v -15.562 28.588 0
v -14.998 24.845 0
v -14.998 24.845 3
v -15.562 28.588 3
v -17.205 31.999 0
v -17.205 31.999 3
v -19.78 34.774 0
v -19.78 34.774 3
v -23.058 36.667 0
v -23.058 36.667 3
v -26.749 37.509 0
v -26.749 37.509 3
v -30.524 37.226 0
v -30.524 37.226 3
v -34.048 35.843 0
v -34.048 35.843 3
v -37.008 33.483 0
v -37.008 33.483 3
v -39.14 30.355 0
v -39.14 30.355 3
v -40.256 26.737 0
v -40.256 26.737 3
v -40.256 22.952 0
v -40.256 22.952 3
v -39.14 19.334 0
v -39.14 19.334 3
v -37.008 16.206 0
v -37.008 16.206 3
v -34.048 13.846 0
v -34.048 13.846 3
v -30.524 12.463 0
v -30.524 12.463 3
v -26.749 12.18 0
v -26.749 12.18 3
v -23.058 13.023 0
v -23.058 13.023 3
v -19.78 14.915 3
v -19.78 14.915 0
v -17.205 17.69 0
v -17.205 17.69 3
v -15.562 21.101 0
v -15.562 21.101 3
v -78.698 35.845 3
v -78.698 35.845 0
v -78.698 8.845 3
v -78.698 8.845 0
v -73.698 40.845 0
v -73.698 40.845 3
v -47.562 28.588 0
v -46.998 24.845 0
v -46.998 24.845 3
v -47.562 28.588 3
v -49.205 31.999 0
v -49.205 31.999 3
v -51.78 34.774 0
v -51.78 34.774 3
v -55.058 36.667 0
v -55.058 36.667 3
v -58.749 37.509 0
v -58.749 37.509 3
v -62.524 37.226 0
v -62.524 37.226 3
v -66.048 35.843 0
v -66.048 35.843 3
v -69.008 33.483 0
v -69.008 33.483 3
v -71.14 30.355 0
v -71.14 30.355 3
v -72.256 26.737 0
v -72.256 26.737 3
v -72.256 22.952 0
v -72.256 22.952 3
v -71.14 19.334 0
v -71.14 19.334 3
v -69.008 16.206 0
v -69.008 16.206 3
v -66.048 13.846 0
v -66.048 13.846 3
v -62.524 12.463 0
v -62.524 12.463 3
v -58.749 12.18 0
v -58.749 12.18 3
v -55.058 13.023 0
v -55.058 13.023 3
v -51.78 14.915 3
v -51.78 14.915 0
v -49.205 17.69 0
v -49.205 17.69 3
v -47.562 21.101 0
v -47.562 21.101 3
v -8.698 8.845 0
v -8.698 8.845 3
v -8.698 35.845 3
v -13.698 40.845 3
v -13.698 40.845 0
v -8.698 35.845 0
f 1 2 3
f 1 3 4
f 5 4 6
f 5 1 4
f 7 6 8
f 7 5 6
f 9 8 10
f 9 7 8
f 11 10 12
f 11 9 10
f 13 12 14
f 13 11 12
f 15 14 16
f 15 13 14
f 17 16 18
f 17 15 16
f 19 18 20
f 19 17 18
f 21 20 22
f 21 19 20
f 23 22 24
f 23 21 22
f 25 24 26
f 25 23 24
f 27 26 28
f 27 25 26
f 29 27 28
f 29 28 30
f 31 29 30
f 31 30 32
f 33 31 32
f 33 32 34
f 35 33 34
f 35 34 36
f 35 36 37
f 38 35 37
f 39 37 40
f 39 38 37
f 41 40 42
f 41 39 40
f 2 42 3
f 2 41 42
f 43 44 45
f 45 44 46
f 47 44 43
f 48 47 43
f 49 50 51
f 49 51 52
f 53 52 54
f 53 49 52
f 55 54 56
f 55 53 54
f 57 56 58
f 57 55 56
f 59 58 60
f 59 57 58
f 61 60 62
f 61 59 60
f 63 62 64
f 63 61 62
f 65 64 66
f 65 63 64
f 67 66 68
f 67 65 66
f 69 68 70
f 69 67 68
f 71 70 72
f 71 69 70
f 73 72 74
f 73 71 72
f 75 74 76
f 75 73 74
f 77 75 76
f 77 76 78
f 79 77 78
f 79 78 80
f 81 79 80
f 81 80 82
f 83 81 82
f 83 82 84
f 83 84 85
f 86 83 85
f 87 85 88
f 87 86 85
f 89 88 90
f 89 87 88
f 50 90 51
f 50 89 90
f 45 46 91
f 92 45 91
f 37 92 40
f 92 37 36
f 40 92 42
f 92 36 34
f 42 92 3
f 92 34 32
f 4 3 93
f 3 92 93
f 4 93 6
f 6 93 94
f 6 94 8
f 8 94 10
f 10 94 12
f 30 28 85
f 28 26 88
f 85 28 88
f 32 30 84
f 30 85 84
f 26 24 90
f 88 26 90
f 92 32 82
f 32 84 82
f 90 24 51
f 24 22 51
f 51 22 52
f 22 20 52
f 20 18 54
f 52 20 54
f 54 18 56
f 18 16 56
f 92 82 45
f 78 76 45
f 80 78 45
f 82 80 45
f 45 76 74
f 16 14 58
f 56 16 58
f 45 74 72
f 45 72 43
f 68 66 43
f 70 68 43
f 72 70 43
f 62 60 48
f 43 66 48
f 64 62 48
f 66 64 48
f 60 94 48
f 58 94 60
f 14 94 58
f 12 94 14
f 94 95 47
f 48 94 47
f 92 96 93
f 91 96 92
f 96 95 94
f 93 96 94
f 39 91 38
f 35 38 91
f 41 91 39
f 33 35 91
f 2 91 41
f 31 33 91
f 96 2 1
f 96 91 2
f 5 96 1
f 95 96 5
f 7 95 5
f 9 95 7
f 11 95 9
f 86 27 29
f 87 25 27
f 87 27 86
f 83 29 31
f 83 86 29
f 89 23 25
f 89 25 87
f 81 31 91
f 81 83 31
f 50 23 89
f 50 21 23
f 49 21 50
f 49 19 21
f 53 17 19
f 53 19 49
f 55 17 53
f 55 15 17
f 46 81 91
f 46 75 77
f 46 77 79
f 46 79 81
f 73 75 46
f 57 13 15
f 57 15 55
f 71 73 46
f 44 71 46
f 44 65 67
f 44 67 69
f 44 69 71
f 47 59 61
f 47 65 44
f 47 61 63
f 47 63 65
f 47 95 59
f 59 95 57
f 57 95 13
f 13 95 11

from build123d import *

# Parameters (mm, degrees)
SKETCH1_R           = 12.7
BOSS_EXTRUDE1_DEPTH = 3
CHAMFER1_SIZE       = 5


with BuildPart() as part:
    # Sketch1 → Boss-Extrude1 (new body)
    with BuildSketch(Plane.XY):
        Polygon((-78.698002714, 24.844630316), (-78.698002714, 40.844630316), (-59.698002714, 40.844630316), (-8.698002714, 40.844630316), (-8.698002714, 8.844630316), (-59.698002714, 8.844630316), (-78.698002714, 8.844630316), align=None)
        with Locations((-59.698002714, 24.844630316)):
            Circle(SKETCH1_R, mode=Mode.SUBTRACT)
        with Locations((-27.698002714, 24.844630316)):
            Circle(SKETCH1_R, mode=Mode.SUBTRACT)
    extrude(amount=BOSS_EXTRUDE1_DEPTH)

    # Chamfer1
    chamfer1_edges = [part.edges().sort_by_distance(p)[0] for p in [
        (-8.698002714, 40.844630316, 1.5),
        (-78.698002714, 40.844630316, 1.5),
    ]]
    chamfer(chamfer1_edges, length=CHAMFER1_SIZE)


solid = part.part
